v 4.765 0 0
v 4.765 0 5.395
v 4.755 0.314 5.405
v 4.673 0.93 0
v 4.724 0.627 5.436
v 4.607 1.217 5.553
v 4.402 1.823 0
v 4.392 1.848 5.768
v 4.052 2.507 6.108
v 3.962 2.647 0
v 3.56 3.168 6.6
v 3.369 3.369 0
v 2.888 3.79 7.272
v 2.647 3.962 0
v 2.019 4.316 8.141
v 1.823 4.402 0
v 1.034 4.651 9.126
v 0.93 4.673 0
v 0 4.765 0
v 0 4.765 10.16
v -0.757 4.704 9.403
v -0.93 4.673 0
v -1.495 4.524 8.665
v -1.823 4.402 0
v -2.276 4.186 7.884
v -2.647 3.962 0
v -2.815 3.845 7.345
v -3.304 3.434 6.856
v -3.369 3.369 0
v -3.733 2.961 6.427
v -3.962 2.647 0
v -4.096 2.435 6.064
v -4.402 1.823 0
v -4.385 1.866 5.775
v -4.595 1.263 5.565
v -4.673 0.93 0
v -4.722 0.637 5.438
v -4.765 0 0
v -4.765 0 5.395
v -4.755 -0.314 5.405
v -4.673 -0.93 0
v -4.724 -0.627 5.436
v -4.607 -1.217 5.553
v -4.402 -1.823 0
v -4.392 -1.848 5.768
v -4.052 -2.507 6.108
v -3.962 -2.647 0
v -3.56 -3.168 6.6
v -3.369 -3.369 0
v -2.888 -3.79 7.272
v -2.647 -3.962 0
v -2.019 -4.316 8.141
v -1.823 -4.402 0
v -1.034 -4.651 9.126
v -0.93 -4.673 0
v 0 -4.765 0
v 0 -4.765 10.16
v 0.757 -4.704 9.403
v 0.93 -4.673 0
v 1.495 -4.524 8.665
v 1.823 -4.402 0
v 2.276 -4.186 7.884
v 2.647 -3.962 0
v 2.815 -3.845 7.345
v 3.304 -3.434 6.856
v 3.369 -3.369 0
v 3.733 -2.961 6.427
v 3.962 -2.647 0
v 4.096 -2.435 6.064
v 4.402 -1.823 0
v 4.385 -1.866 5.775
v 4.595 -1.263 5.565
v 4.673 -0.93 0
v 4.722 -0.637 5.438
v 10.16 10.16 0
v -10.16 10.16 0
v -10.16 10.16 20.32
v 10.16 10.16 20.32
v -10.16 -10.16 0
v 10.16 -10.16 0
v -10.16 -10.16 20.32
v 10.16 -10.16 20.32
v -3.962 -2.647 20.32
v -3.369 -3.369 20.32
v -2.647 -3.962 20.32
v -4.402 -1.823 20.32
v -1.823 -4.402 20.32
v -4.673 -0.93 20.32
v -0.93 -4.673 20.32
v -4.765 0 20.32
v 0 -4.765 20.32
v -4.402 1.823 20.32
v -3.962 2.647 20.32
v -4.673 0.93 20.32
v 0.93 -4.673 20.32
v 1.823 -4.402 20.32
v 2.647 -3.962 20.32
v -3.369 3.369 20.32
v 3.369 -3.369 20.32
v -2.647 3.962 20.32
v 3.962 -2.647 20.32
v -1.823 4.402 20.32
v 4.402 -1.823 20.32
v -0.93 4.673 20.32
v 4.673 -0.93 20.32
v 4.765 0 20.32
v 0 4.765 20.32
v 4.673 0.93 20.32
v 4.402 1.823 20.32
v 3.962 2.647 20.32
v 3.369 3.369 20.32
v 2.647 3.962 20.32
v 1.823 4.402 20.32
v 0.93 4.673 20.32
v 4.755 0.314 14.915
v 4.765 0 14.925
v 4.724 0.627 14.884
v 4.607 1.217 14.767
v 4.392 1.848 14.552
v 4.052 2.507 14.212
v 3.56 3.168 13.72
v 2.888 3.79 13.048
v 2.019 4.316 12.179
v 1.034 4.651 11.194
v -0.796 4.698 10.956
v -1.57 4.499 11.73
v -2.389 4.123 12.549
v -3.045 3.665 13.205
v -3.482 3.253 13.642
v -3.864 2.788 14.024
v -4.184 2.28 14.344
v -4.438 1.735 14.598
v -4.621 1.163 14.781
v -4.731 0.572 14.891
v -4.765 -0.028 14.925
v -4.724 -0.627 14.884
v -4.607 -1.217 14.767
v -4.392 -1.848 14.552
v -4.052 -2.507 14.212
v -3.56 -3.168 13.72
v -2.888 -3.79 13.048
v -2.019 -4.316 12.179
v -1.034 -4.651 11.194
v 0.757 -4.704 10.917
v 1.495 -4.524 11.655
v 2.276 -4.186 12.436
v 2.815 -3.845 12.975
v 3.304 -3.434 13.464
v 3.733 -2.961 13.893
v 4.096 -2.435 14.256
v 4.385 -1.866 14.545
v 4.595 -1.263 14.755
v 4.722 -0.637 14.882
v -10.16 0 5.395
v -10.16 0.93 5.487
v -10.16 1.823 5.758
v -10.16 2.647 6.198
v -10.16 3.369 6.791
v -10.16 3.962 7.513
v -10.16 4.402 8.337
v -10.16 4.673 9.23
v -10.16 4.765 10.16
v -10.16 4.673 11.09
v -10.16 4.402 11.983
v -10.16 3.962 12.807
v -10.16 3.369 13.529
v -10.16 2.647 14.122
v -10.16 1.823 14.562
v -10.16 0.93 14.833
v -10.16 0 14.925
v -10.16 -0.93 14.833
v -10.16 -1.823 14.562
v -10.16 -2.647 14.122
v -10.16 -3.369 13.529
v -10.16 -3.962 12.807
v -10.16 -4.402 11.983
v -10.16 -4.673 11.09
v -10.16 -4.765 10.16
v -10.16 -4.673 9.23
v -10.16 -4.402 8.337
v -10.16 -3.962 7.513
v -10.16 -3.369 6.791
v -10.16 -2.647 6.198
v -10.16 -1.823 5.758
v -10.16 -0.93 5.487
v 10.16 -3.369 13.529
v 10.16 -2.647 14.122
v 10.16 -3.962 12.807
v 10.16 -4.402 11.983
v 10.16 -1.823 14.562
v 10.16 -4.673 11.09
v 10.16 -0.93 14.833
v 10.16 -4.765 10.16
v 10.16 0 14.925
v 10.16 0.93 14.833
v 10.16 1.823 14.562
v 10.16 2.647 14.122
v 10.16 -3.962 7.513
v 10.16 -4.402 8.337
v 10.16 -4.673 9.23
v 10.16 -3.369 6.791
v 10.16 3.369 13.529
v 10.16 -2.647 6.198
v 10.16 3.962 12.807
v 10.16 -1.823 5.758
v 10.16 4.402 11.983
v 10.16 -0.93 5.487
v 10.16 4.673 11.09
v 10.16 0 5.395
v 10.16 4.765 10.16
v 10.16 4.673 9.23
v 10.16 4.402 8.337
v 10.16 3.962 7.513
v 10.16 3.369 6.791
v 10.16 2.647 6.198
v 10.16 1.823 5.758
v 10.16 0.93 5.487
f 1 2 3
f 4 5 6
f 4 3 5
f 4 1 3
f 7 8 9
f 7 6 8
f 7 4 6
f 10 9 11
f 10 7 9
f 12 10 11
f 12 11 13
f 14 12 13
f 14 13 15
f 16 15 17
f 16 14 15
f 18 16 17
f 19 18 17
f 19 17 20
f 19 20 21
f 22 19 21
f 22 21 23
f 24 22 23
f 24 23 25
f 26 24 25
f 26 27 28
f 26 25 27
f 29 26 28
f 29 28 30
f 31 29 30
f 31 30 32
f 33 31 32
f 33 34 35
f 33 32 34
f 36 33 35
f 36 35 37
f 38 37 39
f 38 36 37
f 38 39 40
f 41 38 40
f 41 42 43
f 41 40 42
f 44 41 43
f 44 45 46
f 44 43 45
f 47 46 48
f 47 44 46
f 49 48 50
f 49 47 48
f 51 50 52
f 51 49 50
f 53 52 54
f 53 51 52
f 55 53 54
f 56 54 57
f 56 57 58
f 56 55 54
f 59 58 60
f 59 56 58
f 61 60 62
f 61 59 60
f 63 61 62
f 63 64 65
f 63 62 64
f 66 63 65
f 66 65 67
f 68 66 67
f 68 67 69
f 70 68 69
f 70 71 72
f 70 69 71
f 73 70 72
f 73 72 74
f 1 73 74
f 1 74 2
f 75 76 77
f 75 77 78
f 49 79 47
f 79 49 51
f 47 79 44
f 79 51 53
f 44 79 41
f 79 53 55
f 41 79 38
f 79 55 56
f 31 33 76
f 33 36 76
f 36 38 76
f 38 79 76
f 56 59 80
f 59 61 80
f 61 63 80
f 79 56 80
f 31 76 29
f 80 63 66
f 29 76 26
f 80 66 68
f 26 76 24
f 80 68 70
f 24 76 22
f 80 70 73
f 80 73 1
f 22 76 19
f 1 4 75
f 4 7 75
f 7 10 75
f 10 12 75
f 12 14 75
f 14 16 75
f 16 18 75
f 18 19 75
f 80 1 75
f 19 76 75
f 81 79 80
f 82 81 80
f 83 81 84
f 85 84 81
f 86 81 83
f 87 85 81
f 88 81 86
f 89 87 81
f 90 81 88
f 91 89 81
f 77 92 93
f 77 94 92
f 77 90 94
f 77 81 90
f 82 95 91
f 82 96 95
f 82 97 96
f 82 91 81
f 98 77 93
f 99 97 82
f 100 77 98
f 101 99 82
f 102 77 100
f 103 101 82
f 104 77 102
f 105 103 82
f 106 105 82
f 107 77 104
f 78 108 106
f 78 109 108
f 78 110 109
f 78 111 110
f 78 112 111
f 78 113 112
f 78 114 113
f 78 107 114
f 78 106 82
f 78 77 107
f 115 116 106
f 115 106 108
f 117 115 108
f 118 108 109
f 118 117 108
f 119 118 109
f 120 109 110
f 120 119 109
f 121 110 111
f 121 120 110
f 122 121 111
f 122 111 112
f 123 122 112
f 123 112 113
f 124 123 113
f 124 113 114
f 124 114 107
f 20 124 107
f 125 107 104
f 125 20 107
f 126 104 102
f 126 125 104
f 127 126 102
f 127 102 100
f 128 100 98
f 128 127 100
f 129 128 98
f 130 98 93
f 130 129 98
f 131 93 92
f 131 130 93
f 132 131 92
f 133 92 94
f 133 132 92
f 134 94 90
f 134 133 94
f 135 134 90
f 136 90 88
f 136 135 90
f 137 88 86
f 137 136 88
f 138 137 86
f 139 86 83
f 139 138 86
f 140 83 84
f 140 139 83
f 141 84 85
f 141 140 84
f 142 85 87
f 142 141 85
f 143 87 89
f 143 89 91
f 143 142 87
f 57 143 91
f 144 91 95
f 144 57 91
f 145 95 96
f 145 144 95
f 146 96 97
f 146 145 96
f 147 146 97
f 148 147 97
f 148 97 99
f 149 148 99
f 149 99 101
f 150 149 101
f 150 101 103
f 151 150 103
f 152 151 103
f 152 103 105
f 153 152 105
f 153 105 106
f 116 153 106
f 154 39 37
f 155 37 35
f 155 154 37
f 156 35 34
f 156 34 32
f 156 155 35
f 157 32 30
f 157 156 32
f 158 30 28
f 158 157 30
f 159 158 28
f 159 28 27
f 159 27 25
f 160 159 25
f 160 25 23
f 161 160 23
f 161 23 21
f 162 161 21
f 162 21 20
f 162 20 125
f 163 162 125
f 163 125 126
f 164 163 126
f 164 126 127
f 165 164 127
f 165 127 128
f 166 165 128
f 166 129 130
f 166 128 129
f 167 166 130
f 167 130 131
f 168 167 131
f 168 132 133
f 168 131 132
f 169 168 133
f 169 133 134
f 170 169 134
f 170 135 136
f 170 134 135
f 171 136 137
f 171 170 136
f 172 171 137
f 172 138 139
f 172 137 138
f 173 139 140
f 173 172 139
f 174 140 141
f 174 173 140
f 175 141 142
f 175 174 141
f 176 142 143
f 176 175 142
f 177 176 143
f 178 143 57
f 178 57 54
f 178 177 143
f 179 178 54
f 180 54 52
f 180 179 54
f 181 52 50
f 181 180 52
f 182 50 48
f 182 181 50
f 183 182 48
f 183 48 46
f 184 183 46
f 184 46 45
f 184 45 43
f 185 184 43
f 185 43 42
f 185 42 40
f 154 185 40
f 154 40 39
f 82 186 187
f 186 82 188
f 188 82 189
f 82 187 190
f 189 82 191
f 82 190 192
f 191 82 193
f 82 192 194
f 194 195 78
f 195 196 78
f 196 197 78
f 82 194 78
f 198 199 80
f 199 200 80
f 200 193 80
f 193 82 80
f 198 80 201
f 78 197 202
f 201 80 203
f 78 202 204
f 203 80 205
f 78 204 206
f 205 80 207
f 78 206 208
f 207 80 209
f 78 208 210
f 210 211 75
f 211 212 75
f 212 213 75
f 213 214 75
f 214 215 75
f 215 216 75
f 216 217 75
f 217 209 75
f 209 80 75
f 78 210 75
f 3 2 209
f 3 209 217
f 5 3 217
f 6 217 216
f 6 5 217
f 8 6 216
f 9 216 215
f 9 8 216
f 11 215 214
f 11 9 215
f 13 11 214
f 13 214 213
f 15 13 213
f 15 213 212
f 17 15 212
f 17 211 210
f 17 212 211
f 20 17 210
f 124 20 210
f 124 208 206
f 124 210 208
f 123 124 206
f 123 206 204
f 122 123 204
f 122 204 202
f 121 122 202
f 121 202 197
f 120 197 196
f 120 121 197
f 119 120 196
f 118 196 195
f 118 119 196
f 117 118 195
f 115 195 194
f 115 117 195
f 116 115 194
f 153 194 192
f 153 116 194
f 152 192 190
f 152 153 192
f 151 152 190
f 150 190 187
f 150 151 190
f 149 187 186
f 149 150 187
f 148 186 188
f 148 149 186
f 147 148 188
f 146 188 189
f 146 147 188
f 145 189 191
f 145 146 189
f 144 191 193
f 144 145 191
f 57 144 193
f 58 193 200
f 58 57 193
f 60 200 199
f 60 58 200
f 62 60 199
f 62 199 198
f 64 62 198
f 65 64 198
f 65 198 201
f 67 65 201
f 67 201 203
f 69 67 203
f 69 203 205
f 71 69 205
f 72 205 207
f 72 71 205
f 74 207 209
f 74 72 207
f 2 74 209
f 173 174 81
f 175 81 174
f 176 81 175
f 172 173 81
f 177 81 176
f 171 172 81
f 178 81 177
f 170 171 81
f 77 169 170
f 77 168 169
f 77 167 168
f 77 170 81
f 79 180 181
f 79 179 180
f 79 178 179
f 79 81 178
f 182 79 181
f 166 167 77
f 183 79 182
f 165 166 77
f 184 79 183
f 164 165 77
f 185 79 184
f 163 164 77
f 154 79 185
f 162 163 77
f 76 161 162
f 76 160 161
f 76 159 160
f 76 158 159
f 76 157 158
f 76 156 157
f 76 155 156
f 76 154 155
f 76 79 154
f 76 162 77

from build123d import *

# Parameters (mm, degrees)
SKETCH1_W               = 20.32
SKETCH1_H               = 20.32
SKETCH1_R               = 4.765
BOSS_EXTRUDE1_DEPTH     = 20.32
CUT_EXTRUDE1_DEPTH      = 18.597636205
CUT_EXTRUDE1_DEPTH_BACK = 18.597636205
SKETCH2_R               = 4.765


with BuildPart() as part:
    # Sketch1 → Boss-Extrude1 (new body)
    with BuildSketch(Plane.XY):
        Rectangle(SKETCH1_W, SKETCH1_H)
        Circle(SKETCH1_R, mode=Mode.SUBTRACT)
    extrude(amount=BOSS_EXTRUDE1_DEPTH)

    # Sketch2 → Cut-Extrude1 (cut, two sides: drawn at the far end of the back side and taken through both)
    with BuildSketch(Plane(origin=(0, 0, 10.16), x_dir=(0, 0, -1), z_dir=(1, 0, 0)).offset(-CUT_EXTRUDE1_DEPTH_BACK)):
        Circle(SKETCH2_R)
    extrude(amount=CUT_EXTRUDE1_DEPTH + CUT_EXTRUDE1_DEPTH_BACK, mode=Mode.SUBTRACT)


solid = part.part
